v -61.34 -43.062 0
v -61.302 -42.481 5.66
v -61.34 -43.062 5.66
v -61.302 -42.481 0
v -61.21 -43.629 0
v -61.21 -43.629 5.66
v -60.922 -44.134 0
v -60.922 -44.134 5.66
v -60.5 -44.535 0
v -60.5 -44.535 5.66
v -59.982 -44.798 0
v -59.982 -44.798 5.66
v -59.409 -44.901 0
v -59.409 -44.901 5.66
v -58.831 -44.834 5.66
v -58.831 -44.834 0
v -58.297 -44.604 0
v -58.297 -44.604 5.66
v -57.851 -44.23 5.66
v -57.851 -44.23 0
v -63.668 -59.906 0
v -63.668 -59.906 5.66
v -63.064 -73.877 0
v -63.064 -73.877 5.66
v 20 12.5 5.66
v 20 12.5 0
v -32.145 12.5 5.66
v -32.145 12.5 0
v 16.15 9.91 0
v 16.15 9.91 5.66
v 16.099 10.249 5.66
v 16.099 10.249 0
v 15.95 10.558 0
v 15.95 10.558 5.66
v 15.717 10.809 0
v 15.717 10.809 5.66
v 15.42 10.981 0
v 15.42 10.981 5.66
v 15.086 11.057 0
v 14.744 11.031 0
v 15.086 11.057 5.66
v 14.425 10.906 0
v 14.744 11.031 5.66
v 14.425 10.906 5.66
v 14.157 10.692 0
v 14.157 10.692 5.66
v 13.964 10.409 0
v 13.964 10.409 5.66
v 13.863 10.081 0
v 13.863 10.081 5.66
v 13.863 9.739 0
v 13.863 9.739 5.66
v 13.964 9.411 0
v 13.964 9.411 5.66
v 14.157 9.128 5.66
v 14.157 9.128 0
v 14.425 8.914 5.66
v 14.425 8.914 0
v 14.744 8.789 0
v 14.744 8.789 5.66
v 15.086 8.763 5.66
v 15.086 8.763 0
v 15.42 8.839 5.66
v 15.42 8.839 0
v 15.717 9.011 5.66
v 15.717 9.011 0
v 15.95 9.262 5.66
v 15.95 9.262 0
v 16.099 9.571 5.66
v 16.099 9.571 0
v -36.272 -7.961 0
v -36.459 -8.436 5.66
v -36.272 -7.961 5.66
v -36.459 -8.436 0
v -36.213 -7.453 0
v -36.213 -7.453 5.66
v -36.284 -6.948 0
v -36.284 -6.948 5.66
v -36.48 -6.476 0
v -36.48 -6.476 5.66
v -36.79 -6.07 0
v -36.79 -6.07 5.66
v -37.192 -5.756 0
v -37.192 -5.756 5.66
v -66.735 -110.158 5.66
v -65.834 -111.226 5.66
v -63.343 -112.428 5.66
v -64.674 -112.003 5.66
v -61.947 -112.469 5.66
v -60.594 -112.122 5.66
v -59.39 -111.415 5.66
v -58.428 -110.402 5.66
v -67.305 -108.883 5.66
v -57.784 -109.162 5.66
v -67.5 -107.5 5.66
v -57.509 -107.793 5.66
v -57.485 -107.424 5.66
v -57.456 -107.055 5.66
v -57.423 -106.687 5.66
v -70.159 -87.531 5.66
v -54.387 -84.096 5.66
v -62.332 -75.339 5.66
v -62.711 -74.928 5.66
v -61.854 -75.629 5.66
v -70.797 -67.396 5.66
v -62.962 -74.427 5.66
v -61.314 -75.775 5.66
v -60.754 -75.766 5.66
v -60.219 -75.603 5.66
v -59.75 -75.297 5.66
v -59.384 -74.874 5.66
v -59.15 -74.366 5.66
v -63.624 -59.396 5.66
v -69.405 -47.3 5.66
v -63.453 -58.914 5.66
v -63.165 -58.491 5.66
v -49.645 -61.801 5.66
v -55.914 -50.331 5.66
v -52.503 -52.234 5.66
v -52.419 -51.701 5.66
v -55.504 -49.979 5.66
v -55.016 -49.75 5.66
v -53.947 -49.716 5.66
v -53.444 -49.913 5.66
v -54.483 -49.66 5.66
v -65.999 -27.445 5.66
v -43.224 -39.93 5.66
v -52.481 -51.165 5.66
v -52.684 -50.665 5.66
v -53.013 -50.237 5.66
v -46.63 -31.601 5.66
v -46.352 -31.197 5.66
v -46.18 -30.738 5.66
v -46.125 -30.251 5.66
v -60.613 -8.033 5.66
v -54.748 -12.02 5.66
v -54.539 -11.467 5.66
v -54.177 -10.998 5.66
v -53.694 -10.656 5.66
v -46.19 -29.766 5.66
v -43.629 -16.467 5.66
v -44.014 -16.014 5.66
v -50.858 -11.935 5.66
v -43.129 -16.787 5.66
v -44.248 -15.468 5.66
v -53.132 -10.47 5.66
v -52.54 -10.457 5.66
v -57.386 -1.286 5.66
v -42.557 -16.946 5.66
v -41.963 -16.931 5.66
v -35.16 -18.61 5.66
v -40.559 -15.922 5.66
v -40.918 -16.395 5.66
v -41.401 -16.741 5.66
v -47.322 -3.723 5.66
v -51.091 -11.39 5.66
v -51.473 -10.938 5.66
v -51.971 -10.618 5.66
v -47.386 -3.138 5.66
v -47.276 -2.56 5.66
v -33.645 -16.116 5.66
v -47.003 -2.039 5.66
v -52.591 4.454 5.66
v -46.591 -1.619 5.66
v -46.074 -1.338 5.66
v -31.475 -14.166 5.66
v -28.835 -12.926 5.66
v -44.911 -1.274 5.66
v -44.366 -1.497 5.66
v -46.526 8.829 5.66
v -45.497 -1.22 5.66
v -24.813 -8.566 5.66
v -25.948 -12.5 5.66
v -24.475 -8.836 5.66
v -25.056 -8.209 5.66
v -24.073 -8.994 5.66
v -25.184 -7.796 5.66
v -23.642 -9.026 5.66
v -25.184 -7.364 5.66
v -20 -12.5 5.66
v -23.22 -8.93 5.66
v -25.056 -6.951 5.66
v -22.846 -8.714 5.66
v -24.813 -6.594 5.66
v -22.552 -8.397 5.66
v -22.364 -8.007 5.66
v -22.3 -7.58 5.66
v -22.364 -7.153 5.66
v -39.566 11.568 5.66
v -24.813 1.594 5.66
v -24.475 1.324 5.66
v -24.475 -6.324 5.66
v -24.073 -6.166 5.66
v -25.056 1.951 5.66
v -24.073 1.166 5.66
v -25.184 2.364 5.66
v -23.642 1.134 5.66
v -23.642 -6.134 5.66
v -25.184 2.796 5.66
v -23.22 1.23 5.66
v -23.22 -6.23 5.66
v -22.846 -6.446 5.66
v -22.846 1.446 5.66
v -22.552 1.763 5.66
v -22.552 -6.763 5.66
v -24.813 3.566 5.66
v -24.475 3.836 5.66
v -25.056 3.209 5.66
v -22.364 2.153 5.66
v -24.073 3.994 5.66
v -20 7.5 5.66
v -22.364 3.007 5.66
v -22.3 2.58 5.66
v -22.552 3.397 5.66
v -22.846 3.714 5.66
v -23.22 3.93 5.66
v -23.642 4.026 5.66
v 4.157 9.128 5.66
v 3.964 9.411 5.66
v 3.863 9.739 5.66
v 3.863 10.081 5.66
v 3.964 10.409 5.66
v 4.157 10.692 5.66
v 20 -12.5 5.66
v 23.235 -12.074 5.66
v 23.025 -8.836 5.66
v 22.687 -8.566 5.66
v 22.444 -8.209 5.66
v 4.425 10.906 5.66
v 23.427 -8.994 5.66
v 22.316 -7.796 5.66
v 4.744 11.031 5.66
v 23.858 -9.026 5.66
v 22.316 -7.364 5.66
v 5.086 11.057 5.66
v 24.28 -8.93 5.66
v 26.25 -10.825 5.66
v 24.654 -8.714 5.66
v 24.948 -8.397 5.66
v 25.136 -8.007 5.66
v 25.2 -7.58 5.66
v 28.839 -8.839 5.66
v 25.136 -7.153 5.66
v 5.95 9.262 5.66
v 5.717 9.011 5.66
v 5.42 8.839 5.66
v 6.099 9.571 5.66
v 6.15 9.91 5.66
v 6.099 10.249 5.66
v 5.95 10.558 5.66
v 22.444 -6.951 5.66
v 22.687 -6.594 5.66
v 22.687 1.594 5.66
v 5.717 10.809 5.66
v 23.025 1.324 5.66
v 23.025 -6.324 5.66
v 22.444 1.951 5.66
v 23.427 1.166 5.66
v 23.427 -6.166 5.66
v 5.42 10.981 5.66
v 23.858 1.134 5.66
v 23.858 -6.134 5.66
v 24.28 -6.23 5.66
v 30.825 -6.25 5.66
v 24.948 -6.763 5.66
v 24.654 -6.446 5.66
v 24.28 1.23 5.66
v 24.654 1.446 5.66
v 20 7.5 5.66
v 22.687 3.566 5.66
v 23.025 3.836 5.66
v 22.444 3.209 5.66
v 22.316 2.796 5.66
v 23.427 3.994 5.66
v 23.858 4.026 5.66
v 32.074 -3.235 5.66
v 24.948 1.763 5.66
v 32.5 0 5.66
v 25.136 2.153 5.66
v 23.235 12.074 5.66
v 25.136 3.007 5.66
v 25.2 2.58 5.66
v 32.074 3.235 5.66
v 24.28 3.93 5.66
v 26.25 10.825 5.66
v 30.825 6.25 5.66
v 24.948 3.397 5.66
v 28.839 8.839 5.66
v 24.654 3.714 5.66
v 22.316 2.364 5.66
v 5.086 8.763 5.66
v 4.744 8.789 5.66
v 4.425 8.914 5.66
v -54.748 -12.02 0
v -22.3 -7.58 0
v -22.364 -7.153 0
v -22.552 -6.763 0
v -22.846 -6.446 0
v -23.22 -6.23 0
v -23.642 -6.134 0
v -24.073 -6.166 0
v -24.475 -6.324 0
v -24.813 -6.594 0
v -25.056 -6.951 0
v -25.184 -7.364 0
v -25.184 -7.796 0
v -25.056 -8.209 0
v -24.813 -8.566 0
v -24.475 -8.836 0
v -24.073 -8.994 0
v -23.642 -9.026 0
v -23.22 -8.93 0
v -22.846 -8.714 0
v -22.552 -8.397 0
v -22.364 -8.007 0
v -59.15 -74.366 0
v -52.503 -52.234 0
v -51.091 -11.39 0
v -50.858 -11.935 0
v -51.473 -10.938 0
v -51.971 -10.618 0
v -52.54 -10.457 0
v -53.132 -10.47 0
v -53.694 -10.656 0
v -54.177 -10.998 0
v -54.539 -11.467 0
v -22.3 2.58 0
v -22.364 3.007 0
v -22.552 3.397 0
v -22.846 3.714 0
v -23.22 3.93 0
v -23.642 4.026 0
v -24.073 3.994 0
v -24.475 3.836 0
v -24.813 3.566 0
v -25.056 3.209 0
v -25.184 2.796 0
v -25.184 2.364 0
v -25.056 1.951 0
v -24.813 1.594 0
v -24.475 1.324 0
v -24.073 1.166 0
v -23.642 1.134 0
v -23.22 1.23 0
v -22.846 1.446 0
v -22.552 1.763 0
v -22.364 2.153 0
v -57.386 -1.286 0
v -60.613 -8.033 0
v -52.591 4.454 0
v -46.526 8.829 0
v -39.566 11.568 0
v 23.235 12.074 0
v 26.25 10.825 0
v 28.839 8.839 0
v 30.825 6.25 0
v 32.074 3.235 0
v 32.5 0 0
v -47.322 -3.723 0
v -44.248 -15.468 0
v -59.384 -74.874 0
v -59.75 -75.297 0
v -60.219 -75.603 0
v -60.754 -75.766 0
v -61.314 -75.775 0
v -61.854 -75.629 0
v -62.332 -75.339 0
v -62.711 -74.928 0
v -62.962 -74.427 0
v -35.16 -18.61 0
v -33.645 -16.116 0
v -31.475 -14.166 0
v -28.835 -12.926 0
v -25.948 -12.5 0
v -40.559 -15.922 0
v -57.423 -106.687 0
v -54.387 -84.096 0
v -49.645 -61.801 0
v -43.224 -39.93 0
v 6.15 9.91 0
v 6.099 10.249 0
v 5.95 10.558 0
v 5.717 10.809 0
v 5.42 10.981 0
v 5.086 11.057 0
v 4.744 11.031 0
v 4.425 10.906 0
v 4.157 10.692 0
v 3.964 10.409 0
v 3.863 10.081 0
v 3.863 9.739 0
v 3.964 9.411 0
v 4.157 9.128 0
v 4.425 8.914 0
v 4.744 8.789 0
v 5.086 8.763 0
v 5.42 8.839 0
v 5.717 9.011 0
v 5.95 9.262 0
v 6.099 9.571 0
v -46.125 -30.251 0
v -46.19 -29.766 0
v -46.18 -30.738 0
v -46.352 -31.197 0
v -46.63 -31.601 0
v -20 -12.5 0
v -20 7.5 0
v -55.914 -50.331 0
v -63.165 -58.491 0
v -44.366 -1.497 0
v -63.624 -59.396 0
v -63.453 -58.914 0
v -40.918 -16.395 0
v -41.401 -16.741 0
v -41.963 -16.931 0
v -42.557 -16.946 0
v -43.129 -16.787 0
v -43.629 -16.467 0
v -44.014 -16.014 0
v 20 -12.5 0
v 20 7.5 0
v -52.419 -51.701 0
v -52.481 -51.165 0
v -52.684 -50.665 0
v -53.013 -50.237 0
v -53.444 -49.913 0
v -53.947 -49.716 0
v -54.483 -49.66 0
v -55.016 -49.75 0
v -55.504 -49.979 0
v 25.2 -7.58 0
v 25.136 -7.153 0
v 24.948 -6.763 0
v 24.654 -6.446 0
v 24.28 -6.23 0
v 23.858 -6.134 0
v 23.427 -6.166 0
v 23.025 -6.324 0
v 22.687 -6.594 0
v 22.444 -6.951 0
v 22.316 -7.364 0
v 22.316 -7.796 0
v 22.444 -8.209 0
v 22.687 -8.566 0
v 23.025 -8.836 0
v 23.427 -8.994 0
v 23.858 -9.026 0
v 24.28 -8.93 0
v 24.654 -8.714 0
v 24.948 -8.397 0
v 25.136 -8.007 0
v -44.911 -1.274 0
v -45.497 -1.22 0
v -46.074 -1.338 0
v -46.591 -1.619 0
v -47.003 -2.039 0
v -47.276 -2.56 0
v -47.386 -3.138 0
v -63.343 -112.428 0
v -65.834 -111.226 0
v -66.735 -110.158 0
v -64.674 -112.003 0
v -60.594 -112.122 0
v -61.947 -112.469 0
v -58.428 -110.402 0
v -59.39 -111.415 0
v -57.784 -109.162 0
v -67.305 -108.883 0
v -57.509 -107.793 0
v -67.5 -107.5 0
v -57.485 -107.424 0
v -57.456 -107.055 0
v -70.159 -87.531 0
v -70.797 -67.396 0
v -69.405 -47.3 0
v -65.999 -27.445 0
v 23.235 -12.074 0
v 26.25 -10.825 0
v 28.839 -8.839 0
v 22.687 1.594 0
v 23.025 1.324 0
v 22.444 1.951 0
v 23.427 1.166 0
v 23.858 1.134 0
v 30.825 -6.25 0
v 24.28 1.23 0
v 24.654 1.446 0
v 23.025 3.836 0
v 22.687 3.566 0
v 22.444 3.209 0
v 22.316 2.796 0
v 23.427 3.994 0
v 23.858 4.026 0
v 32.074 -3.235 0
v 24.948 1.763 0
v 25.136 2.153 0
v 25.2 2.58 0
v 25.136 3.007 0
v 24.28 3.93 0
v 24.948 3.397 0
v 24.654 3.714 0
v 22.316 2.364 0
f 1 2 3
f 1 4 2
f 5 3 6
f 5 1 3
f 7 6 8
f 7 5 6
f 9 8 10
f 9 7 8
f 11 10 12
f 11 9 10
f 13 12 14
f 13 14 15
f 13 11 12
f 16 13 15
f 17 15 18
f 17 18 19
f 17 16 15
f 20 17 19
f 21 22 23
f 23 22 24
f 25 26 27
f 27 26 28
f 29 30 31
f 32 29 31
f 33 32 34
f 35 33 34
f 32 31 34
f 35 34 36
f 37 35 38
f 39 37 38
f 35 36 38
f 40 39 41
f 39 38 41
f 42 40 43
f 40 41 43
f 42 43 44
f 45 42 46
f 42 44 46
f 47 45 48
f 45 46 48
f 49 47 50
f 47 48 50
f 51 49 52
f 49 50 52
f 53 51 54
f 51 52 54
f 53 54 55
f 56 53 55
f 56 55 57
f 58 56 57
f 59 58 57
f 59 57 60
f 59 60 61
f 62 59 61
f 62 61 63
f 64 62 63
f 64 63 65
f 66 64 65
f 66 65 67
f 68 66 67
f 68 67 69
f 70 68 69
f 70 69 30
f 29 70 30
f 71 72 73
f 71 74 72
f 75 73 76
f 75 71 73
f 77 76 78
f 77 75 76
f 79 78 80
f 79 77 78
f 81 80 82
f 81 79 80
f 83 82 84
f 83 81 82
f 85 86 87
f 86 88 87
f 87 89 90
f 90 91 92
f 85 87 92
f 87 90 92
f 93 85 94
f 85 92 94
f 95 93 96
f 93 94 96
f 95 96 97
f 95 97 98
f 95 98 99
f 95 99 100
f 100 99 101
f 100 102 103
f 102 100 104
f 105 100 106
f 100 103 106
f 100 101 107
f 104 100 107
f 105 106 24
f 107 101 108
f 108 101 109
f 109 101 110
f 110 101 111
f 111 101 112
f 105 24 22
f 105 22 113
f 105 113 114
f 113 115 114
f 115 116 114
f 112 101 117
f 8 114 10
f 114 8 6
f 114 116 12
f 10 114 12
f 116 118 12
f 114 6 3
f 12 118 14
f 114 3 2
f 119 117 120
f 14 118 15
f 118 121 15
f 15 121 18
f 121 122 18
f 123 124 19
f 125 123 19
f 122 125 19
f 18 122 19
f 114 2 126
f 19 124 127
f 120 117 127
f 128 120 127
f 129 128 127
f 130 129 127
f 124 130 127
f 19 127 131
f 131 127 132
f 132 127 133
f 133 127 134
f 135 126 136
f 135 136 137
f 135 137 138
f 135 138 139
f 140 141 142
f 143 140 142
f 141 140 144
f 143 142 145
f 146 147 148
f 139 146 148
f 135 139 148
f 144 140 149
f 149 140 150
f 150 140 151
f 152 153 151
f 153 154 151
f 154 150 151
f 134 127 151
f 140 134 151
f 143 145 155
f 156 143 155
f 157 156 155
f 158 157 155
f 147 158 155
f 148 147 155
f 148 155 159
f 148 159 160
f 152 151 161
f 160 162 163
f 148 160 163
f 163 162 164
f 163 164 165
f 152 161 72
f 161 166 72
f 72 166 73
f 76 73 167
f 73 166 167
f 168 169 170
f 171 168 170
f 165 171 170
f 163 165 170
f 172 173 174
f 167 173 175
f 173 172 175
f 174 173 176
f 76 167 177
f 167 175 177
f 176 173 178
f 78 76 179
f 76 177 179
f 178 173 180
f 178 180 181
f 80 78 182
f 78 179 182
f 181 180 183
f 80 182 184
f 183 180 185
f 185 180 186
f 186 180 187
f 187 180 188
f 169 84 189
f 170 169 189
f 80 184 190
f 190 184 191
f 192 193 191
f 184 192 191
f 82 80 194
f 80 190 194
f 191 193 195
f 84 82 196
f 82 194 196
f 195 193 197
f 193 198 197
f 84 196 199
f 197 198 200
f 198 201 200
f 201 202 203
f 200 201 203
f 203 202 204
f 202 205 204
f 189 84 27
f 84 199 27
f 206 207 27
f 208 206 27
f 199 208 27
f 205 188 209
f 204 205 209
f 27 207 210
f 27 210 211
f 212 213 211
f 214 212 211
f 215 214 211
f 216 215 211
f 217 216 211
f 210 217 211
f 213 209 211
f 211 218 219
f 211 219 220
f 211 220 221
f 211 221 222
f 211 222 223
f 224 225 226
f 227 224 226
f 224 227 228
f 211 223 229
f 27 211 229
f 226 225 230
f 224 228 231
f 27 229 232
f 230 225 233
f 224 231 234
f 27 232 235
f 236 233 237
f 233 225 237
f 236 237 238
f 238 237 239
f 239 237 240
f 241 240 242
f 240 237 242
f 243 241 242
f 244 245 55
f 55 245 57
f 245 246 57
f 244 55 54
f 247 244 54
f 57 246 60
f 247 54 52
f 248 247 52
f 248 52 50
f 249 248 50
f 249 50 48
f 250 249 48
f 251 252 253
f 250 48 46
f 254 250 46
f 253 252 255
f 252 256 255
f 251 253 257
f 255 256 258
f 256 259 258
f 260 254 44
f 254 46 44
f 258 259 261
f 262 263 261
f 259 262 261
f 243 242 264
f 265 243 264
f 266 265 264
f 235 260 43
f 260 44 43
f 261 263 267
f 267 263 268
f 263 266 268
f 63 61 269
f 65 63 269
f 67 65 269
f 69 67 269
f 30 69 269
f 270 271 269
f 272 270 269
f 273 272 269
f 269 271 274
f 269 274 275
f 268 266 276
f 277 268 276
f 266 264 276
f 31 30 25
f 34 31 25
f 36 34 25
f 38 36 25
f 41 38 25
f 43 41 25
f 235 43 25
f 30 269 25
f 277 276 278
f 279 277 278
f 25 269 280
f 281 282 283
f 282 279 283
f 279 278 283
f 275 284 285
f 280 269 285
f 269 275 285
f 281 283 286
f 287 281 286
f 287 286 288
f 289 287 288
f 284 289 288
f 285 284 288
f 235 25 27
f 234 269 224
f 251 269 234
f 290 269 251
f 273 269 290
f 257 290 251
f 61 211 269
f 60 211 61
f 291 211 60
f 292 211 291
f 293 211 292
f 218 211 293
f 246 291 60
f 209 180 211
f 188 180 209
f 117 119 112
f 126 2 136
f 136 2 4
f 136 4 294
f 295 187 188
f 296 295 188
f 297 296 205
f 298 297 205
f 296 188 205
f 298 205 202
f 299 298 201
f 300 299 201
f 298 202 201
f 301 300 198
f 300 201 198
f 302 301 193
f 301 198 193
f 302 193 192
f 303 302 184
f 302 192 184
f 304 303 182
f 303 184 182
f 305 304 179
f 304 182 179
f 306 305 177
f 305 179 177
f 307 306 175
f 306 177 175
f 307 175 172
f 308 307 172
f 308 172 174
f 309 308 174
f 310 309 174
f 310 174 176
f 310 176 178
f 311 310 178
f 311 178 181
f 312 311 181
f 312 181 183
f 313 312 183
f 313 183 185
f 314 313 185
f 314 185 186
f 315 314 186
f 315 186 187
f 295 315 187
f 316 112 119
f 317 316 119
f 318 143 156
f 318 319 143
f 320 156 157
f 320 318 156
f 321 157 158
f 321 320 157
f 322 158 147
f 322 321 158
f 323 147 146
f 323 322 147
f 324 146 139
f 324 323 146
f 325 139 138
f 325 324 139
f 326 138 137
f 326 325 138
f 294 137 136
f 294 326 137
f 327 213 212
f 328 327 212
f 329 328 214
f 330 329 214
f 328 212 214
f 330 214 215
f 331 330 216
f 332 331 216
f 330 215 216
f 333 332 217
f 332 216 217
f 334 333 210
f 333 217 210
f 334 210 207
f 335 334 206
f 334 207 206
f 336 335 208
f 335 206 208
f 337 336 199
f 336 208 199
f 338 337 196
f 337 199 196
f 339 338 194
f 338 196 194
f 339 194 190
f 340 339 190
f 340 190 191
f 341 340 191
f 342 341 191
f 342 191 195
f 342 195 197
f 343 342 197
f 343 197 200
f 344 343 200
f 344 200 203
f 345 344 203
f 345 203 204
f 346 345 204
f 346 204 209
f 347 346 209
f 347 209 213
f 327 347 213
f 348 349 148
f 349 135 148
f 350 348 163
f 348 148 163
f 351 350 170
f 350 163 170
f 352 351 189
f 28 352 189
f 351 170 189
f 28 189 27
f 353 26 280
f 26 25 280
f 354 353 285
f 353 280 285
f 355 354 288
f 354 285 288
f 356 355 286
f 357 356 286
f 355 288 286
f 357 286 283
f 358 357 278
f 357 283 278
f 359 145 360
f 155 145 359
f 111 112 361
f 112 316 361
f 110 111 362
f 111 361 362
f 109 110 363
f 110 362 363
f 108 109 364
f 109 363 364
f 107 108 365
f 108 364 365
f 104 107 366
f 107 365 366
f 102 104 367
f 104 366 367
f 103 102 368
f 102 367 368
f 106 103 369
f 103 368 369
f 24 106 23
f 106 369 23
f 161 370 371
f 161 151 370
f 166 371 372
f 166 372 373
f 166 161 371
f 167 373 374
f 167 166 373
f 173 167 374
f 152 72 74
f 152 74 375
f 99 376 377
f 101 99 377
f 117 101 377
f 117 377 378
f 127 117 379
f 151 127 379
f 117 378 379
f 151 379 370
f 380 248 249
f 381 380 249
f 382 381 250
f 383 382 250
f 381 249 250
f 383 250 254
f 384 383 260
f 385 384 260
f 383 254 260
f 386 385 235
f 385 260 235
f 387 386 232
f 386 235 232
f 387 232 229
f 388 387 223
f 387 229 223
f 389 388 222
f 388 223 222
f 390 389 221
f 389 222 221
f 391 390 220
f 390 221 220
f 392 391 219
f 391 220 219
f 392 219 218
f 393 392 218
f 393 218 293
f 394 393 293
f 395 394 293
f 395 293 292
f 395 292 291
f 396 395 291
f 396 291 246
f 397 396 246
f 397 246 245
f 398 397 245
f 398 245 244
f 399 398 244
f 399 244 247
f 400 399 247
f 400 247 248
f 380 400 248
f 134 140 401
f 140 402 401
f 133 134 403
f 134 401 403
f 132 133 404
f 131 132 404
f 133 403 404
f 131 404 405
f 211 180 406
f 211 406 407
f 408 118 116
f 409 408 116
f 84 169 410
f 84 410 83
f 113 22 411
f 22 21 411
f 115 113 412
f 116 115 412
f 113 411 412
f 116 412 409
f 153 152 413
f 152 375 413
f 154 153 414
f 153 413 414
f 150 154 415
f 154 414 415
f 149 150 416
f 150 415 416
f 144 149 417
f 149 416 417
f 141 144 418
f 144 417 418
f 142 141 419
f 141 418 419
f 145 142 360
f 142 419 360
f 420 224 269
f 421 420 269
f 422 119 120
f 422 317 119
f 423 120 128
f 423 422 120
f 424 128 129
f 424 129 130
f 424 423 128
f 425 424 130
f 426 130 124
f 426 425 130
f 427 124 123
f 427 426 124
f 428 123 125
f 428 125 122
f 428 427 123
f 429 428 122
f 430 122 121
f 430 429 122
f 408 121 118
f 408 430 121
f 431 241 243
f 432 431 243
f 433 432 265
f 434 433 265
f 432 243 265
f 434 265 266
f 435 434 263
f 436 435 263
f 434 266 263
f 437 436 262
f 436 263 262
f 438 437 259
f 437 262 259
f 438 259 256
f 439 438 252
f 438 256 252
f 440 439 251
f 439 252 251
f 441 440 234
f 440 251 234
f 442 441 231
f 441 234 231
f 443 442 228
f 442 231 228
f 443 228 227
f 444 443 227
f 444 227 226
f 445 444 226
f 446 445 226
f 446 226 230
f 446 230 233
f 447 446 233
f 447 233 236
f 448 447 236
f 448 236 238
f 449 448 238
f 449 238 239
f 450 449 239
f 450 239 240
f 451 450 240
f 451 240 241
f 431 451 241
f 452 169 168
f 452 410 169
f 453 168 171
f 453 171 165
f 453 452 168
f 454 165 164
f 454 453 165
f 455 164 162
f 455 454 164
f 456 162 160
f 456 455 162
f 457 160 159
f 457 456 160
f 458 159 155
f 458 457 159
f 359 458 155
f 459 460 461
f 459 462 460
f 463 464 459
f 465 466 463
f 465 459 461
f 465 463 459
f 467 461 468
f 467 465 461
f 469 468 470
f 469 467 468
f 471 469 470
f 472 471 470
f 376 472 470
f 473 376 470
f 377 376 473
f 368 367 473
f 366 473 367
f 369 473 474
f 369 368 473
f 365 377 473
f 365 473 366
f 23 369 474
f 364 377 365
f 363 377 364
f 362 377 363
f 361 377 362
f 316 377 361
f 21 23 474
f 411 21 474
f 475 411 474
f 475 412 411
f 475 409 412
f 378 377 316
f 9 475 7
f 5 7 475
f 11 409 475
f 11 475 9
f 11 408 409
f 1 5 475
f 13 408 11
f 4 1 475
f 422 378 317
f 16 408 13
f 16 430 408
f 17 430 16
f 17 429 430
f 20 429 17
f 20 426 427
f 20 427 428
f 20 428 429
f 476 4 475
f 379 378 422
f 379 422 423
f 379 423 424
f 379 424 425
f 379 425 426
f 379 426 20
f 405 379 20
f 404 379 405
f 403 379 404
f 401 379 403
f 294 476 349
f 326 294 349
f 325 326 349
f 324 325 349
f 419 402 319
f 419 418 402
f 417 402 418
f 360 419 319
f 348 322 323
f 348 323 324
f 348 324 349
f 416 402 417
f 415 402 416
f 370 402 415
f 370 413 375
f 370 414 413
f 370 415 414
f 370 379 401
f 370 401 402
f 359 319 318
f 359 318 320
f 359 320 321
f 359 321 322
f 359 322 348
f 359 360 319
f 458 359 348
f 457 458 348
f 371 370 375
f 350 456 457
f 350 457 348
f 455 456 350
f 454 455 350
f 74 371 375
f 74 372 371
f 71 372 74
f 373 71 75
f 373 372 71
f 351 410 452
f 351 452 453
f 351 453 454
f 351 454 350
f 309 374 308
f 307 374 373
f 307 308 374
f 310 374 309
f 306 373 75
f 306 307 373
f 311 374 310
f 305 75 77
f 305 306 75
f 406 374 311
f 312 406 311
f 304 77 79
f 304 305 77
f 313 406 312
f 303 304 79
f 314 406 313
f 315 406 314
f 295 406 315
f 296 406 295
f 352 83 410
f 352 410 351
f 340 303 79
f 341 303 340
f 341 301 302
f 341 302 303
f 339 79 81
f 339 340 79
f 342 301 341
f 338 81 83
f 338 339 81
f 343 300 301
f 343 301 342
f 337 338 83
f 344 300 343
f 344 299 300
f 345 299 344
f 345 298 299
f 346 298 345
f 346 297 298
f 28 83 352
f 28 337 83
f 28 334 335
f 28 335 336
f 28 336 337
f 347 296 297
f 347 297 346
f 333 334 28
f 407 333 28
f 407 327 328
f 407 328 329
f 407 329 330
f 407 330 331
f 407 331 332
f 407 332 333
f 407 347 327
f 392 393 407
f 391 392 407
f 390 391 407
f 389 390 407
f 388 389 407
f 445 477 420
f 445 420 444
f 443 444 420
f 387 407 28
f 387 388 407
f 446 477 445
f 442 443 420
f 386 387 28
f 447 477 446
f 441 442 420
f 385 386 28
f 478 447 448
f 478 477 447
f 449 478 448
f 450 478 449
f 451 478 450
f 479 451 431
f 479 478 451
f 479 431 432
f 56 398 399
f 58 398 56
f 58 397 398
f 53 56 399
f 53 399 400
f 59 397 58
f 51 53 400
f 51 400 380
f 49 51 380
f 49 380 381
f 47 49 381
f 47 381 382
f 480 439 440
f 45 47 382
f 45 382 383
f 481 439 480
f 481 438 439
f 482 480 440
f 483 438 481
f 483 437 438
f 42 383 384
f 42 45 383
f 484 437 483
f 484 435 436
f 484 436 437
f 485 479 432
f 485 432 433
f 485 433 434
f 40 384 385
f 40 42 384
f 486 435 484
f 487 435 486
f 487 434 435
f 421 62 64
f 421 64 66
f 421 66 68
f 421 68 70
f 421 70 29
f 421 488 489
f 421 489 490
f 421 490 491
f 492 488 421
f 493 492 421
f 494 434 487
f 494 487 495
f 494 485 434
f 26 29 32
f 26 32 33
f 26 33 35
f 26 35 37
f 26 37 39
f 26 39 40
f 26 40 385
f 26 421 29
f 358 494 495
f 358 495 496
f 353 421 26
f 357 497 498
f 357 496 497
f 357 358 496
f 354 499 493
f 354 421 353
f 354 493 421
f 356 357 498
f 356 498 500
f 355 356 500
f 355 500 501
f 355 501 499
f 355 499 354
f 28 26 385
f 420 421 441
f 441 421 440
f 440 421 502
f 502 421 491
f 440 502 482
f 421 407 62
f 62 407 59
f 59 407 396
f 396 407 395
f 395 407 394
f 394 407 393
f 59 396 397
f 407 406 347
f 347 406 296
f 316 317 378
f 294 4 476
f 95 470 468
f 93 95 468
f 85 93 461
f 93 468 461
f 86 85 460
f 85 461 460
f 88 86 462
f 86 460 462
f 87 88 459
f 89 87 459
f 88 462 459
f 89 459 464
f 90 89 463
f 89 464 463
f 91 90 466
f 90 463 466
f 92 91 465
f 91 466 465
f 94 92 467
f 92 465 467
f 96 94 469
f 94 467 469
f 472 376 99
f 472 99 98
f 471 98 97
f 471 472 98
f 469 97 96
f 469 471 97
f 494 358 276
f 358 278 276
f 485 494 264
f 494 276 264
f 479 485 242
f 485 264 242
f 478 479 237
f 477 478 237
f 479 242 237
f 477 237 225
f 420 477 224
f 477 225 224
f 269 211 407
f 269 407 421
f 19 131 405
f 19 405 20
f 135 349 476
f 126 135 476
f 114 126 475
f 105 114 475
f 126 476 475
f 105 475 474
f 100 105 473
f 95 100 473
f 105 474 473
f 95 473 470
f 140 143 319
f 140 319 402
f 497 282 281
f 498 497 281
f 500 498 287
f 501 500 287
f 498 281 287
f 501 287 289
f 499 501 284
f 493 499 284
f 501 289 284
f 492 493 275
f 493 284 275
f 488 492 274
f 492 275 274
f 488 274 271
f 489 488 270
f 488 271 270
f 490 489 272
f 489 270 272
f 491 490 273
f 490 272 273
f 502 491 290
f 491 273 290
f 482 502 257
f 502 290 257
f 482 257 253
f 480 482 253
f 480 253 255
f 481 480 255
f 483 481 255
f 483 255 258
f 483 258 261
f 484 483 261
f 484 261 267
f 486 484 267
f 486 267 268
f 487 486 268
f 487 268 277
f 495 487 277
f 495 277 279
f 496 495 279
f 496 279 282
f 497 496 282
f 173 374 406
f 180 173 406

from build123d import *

# Parameters (mm, degrees)
BOSS_EXTRU_1_DEPTH      = 5.66
ENL_V_MAT_EXTRU_1_REACH = 135.062
ESQUISSE2_W             = 40
ESQUISSE2_H             = 20
ENL_V_MAT_EXTRU_2_REACH = 135.062
ESQUISSE3_R             = 1.45
CONG_2_R                = 12.5
CONG_3_R                = 10
CONG_4_R                = 30
CONG_5_R                = 30
ENL_V_MAT_EXTRU_3_REACH = 135.062
CONG_6_R                = 2
ENL_V_MAT_EXTRU_4_REACH = 135.062
ESQUISSE5_R             = 1.15


# Some blends are built 0.0001 mm under size
with BuildPart() as part:
    # Esquisse1 → Boss.-Extru.1 (new body)
    with BuildSketch(Plane.XY):
        with BuildLine():
            Line((-32.5, 12.5), (-52.5, 12.5))
            ThreePointArc((-52.5, 12.5), (-69.287355537, -46.339080558), (-67.5, -107.5))
            ThreePointArc((-67.5, -107.5), (-62.5, -112.5), (-57.5, -107.5))
            ThreePointArc((-57.5, -107.5), (-48.914858734, -58.969774017), (-32.5, -12.5))
            Line((-32.5, -12.5), (32.5, -12.5))
            Line((32.5, -12.5), (32.5, 12.5))
            Line((32.5, 12.5), (-32.5, 12.5))
        make_face()
    extrude(amount=BOSS_EXTRU_1_DEPTH)

    # Esquisse2 → Enlèv. mat.-Extru.1 (cut, up to next)
    with BuildSketch(Plane.XY.offset(5.66), mode=Mode.PRIVATE) as enl_v_mat_extru_1_sk1:
        with Locations((0, -2.5)):
            Rectangle(ESQUISSE2_W, ESQUISSE2_H)
    enl_v_mat_extru_1_tool1 = extrude(enl_v_mat_extru_1_sk1.sketch, amount=-ENL_V_MAT_EXTRU_1_REACH, mode=Mode.PRIVATE) & part.part
    add(enl_v_mat_extru_1_tool1.solids().sort_by_distance((0, -2.5, 5.66))[0], mode=Mode.SUBTRACT)

    # Esquisse3 → Enlèv. mat.-Extru.2 (cut, up to next)
    with BuildSketch(Plane.XY.offset(5.66), mode=Mode.PRIVATE) as enl_v_mat_extru_2_sk1:
        with Locations((-23.75, -7.58)):
            Circle(ESQUISSE3_R)
    enl_v_mat_extru_2_tool1 = extrude(enl_v_mat_extru_2_sk1.sketch, amount=-ENL_V_MAT_EXTRU_2_REACH, mode=Mode.PRIVATE) & part.part
    # Esquisse3 → Enlèv. mat.-Extru.2 (cut, up to next)
    with BuildSketch(Plane.XY.offset(5.66), mode=Mode.PRIVATE) as enl_v_mat_extru_2_sk2:
        with Locations((23.75, -7.58)):
            Circle(ESQUISSE3_R)
    enl_v_mat_extru_2_tool2 = extrude(enl_v_mat_extru_2_sk2.sketch, amount=-ENL_V_MAT_EXTRU_2_REACH, mode=Mode.PRIVATE) & part.part
    # Esquisse3 → Enlèv. mat.-Extru.2 (cut, up to next)
    with BuildSketch(Plane.XY.offset(5.66), mode=Mode.PRIVATE) as enl_v_mat_extru_2_sk3:
        with Locations((23.75, 2.58)):
            Circle(ESQUISSE3_R)
    enl_v_mat_extru_2_tool3 = extrude(enl_v_mat_extru_2_sk3.sketch, amount=-ENL_V_MAT_EXTRU_2_REACH, mode=Mode.PRIVATE) & part.part
    # Esquisse3 → Enlèv. mat.-Extru.2 (cut, up to next)
    with BuildSketch(Plane.XY.offset(5.66), mode=Mode.PRIVATE) as enl_v_mat_extru_2_sk4:
        with Locations((-23.75, 2.58)):
            Circle(ESQUISSE3_R)
    enl_v_mat_extru_2_tool4 = extrude(enl_v_mat_extru_2_sk4.sketch, amount=-ENL_V_MAT_EXTRU_2_REACH, mode=Mode.PRIVATE) & part.part
    add(enl_v_mat_extru_2_tool1.solids().sort_by_distance((-23.75, -7.58, 5.66))[0], mode=Mode.SUBTRACT)
    add(enl_v_mat_extru_2_tool2.solids().sort_by_distance((23.75, -7.58, 5.66))[0], mode=Mode.SUBTRACT)
    add(enl_v_mat_extru_2_tool3.solids().sort_by_distance((23.75, 2.58, 5.66))[0], mode=Mode.SUBTRACT)
    add(enl_v_mat_extru_2_tool4.solids().sort_by_distance((-23.75, 2.58, 5.66))[0], mode=Mode.SUBTRACT)

    # Congé2
    cong_2_edges = [part.edges().sort_by_distance(p)[0] for p in [
        (32.5, -12.5, 2.83),
        (32.5, 12.5, 2.83),
    ]]
    fillet(cong_2_edges, radius=CONG_2_R - 0.0001)  # a hair under: the kernel refuses the full size

    # Congé3
    cong_3_edges = [part.edges().sort_by_distance(p)[0] for p in [
        (-32.5, -12.5, 2.83),
    ]]
    fillet(cong_3_edges, radius=CONG_3_R)

    # Congé4
    cong_4_edges = [part.edges().sort_by_distance(p)[0] for p in [
        (-52.5, 12.5, 2.83),
    ]]
    fillet(cong_4_edges, radius=CONG_4_R)

    # Congé5
    # the kernel refuses this fillet: 30 mm, written as the material it adds along each edge
    with BuildSketch(Plane(origin=(-57.5, -107.5, 0), x_dir=(-0.029294676062998543, -0.9995708188789647, 0), z_dir=(0, 0, 1))) as cong_5_piece_1:
        with BuildLine():
            CenterArc((1.171787043, 29.987124566), CONG_5_R, 266.202223448, 2.119075089)
            ThreePointArc((-0.815268333, 0.053003384), (-0.407652209, 0.026224165), (0, 0))
            ThreePointArc((0, 0), (0.14647338, 0.002145906), (0.292946761, 0))
        make_face()
    extrude(amount=5.66)

    # Esquisse4 → Enlèv. mat.-Extru.3 (cut, up to next)
    with BuildSketch(Plane.XY.offset(5.66), mode=Mode.PRIVATE) as enl_v_mat_extru_3_sk1:
        Polygon((-35.530484253, -6.741676359), (-42.974151572, -20.332321303), (-48.555833289, 0.989708193), align=None)
    enl_v_mat_extru_3_tool1 = extrude(enl_v_mat_extru_3_sk1.sketch, amount=-ENL_V_MAT_EXTRU_3_REACH, mode=Mode.PRIVATE) & part.part
    # Esquisse4 → Enlèv. mat.-Extru.3 (cut, up to next)
    with BuildSketch(Plane.XY.offset(5.66), mode=Mode.PRIVATE) as enl_v_mat_extru_3_sk2:
        Polygon((-52.982896502, -3.816878406), (-45.919055028, -30.800759586), (-62.900626013, -49.913479621), align=None)
    enl_v_mat_extru_3_tool2 = extrude(enl_v_mat_extru_3_sk2.sketch, amount=-ENL_V_MAT_EXTRU_3_REACH, mode=Mode.PRIVATE) & part.part
    # Esquisse4 → Enlèv. mat.-Extru.3 (cut, up to next)
    with BuildSketch(Plane.XY.offset(5.66), mode=Mode.PRIVATE) as enl_v_mat_extru_3_sk3:
        Polygon((-49.898192375, -43.559912364), (-63.702500518, -59.0966302), (-62.552958266, -85.696486809), align=None)
    enl_v_mat_extru_3_tool3 = extrude(enl_v_mat_extru_3_sk3.sketch, amount=-ENL_V_MAT_EXTRU_3_REACH, mode=Mode.PRIVATE) & part.part
    add(enl_v_mat_extru_3_tool1.solids().sort_by_distance((-42.35349, -8.694763, 5.66))[0], mode=Mode.SUBTRACT)
    add(enl_v_mat_extru_3_tool2.solids().sort_by_distance((-53.934193, -28.177039, 5.66))[0], mode=Mode.SUBTRACT)
    add(enl_v_mat_extru_3_tool3.solids().sort_by_distance((-58.717884, -62.784343, 5.66))[0], mode=Mode.SUBTRACT)

    # Congé6
    cong_6_edges = [part.edges().sort_by_distance(p)[0] for p in [
        (-62.900626013, -49.913479621, 2.83),
        (-52.982896502, -3.816878406, 2.83),
        (-45.919055028, -30.800759586, 2.83),
        (-49.898192375, -43.559912364, 2.83),
        (-62.552958266, -85.696486809, 2.83),
        (-63.702500518, -59.0966302, 2.83),
        (-48.555833289, 0.989708193, 2.83),
        (-35.530484253, -6.741676359, 2.83),
        (-42.974151572, -20.332321303, 2.83),
    ]]
    fillet(cong_6_edges, radius=CONG_6_R)

    # Esquisse5 → Enlèv. mat.-Extru.4 (cut, up to next)
    with BuildSketch(Plane.XY.offset(5.66), mode=Mode.PRIVATE) as enl_v_mat_extru_4_sk1:
        with Locations((15, 9.91)):
            Circle(ESQUISSE5_R)
    enl_v_mat_extru_4_tool1 = extrude(enl_v_mat_extru_4_sk1.sketch, amount=-ENL_V_MAT_EXTRU_4_REACH, mode=Mode.PRIVATE) & part.part
    # Esquisse5 → Enlèv. mat.-Extru.4 (cut, up to next)
    with BuildSketch(Plane.XY.offset(5.66), mode=Mode.PRIVATE) as enl_v_mat_extru_4_sk2:
        with Locations((5, 9.91)):
            Circle(ESQUISSE5_R)
    enl_v_mat_extru_4_tool2 = extrude(enl_v_mat_extru_4_sk2.sketch, amount=-ENL_V_MAT_EXTRU_4_REACH, mode=Mode.PRIVATE) & part.part
    add(enl_v_mat_extru_4_tool1.solids().sort_by_distance((15, 9.91, 5.66))[0], mode=Mode.SUBTRACT)
    add(enl_v_mat_extru_4_tool2.solids().sort_by_distance((5, 9.91, 5.66))[0], mode=Mode.SUBTRACT)


solid = part.part
